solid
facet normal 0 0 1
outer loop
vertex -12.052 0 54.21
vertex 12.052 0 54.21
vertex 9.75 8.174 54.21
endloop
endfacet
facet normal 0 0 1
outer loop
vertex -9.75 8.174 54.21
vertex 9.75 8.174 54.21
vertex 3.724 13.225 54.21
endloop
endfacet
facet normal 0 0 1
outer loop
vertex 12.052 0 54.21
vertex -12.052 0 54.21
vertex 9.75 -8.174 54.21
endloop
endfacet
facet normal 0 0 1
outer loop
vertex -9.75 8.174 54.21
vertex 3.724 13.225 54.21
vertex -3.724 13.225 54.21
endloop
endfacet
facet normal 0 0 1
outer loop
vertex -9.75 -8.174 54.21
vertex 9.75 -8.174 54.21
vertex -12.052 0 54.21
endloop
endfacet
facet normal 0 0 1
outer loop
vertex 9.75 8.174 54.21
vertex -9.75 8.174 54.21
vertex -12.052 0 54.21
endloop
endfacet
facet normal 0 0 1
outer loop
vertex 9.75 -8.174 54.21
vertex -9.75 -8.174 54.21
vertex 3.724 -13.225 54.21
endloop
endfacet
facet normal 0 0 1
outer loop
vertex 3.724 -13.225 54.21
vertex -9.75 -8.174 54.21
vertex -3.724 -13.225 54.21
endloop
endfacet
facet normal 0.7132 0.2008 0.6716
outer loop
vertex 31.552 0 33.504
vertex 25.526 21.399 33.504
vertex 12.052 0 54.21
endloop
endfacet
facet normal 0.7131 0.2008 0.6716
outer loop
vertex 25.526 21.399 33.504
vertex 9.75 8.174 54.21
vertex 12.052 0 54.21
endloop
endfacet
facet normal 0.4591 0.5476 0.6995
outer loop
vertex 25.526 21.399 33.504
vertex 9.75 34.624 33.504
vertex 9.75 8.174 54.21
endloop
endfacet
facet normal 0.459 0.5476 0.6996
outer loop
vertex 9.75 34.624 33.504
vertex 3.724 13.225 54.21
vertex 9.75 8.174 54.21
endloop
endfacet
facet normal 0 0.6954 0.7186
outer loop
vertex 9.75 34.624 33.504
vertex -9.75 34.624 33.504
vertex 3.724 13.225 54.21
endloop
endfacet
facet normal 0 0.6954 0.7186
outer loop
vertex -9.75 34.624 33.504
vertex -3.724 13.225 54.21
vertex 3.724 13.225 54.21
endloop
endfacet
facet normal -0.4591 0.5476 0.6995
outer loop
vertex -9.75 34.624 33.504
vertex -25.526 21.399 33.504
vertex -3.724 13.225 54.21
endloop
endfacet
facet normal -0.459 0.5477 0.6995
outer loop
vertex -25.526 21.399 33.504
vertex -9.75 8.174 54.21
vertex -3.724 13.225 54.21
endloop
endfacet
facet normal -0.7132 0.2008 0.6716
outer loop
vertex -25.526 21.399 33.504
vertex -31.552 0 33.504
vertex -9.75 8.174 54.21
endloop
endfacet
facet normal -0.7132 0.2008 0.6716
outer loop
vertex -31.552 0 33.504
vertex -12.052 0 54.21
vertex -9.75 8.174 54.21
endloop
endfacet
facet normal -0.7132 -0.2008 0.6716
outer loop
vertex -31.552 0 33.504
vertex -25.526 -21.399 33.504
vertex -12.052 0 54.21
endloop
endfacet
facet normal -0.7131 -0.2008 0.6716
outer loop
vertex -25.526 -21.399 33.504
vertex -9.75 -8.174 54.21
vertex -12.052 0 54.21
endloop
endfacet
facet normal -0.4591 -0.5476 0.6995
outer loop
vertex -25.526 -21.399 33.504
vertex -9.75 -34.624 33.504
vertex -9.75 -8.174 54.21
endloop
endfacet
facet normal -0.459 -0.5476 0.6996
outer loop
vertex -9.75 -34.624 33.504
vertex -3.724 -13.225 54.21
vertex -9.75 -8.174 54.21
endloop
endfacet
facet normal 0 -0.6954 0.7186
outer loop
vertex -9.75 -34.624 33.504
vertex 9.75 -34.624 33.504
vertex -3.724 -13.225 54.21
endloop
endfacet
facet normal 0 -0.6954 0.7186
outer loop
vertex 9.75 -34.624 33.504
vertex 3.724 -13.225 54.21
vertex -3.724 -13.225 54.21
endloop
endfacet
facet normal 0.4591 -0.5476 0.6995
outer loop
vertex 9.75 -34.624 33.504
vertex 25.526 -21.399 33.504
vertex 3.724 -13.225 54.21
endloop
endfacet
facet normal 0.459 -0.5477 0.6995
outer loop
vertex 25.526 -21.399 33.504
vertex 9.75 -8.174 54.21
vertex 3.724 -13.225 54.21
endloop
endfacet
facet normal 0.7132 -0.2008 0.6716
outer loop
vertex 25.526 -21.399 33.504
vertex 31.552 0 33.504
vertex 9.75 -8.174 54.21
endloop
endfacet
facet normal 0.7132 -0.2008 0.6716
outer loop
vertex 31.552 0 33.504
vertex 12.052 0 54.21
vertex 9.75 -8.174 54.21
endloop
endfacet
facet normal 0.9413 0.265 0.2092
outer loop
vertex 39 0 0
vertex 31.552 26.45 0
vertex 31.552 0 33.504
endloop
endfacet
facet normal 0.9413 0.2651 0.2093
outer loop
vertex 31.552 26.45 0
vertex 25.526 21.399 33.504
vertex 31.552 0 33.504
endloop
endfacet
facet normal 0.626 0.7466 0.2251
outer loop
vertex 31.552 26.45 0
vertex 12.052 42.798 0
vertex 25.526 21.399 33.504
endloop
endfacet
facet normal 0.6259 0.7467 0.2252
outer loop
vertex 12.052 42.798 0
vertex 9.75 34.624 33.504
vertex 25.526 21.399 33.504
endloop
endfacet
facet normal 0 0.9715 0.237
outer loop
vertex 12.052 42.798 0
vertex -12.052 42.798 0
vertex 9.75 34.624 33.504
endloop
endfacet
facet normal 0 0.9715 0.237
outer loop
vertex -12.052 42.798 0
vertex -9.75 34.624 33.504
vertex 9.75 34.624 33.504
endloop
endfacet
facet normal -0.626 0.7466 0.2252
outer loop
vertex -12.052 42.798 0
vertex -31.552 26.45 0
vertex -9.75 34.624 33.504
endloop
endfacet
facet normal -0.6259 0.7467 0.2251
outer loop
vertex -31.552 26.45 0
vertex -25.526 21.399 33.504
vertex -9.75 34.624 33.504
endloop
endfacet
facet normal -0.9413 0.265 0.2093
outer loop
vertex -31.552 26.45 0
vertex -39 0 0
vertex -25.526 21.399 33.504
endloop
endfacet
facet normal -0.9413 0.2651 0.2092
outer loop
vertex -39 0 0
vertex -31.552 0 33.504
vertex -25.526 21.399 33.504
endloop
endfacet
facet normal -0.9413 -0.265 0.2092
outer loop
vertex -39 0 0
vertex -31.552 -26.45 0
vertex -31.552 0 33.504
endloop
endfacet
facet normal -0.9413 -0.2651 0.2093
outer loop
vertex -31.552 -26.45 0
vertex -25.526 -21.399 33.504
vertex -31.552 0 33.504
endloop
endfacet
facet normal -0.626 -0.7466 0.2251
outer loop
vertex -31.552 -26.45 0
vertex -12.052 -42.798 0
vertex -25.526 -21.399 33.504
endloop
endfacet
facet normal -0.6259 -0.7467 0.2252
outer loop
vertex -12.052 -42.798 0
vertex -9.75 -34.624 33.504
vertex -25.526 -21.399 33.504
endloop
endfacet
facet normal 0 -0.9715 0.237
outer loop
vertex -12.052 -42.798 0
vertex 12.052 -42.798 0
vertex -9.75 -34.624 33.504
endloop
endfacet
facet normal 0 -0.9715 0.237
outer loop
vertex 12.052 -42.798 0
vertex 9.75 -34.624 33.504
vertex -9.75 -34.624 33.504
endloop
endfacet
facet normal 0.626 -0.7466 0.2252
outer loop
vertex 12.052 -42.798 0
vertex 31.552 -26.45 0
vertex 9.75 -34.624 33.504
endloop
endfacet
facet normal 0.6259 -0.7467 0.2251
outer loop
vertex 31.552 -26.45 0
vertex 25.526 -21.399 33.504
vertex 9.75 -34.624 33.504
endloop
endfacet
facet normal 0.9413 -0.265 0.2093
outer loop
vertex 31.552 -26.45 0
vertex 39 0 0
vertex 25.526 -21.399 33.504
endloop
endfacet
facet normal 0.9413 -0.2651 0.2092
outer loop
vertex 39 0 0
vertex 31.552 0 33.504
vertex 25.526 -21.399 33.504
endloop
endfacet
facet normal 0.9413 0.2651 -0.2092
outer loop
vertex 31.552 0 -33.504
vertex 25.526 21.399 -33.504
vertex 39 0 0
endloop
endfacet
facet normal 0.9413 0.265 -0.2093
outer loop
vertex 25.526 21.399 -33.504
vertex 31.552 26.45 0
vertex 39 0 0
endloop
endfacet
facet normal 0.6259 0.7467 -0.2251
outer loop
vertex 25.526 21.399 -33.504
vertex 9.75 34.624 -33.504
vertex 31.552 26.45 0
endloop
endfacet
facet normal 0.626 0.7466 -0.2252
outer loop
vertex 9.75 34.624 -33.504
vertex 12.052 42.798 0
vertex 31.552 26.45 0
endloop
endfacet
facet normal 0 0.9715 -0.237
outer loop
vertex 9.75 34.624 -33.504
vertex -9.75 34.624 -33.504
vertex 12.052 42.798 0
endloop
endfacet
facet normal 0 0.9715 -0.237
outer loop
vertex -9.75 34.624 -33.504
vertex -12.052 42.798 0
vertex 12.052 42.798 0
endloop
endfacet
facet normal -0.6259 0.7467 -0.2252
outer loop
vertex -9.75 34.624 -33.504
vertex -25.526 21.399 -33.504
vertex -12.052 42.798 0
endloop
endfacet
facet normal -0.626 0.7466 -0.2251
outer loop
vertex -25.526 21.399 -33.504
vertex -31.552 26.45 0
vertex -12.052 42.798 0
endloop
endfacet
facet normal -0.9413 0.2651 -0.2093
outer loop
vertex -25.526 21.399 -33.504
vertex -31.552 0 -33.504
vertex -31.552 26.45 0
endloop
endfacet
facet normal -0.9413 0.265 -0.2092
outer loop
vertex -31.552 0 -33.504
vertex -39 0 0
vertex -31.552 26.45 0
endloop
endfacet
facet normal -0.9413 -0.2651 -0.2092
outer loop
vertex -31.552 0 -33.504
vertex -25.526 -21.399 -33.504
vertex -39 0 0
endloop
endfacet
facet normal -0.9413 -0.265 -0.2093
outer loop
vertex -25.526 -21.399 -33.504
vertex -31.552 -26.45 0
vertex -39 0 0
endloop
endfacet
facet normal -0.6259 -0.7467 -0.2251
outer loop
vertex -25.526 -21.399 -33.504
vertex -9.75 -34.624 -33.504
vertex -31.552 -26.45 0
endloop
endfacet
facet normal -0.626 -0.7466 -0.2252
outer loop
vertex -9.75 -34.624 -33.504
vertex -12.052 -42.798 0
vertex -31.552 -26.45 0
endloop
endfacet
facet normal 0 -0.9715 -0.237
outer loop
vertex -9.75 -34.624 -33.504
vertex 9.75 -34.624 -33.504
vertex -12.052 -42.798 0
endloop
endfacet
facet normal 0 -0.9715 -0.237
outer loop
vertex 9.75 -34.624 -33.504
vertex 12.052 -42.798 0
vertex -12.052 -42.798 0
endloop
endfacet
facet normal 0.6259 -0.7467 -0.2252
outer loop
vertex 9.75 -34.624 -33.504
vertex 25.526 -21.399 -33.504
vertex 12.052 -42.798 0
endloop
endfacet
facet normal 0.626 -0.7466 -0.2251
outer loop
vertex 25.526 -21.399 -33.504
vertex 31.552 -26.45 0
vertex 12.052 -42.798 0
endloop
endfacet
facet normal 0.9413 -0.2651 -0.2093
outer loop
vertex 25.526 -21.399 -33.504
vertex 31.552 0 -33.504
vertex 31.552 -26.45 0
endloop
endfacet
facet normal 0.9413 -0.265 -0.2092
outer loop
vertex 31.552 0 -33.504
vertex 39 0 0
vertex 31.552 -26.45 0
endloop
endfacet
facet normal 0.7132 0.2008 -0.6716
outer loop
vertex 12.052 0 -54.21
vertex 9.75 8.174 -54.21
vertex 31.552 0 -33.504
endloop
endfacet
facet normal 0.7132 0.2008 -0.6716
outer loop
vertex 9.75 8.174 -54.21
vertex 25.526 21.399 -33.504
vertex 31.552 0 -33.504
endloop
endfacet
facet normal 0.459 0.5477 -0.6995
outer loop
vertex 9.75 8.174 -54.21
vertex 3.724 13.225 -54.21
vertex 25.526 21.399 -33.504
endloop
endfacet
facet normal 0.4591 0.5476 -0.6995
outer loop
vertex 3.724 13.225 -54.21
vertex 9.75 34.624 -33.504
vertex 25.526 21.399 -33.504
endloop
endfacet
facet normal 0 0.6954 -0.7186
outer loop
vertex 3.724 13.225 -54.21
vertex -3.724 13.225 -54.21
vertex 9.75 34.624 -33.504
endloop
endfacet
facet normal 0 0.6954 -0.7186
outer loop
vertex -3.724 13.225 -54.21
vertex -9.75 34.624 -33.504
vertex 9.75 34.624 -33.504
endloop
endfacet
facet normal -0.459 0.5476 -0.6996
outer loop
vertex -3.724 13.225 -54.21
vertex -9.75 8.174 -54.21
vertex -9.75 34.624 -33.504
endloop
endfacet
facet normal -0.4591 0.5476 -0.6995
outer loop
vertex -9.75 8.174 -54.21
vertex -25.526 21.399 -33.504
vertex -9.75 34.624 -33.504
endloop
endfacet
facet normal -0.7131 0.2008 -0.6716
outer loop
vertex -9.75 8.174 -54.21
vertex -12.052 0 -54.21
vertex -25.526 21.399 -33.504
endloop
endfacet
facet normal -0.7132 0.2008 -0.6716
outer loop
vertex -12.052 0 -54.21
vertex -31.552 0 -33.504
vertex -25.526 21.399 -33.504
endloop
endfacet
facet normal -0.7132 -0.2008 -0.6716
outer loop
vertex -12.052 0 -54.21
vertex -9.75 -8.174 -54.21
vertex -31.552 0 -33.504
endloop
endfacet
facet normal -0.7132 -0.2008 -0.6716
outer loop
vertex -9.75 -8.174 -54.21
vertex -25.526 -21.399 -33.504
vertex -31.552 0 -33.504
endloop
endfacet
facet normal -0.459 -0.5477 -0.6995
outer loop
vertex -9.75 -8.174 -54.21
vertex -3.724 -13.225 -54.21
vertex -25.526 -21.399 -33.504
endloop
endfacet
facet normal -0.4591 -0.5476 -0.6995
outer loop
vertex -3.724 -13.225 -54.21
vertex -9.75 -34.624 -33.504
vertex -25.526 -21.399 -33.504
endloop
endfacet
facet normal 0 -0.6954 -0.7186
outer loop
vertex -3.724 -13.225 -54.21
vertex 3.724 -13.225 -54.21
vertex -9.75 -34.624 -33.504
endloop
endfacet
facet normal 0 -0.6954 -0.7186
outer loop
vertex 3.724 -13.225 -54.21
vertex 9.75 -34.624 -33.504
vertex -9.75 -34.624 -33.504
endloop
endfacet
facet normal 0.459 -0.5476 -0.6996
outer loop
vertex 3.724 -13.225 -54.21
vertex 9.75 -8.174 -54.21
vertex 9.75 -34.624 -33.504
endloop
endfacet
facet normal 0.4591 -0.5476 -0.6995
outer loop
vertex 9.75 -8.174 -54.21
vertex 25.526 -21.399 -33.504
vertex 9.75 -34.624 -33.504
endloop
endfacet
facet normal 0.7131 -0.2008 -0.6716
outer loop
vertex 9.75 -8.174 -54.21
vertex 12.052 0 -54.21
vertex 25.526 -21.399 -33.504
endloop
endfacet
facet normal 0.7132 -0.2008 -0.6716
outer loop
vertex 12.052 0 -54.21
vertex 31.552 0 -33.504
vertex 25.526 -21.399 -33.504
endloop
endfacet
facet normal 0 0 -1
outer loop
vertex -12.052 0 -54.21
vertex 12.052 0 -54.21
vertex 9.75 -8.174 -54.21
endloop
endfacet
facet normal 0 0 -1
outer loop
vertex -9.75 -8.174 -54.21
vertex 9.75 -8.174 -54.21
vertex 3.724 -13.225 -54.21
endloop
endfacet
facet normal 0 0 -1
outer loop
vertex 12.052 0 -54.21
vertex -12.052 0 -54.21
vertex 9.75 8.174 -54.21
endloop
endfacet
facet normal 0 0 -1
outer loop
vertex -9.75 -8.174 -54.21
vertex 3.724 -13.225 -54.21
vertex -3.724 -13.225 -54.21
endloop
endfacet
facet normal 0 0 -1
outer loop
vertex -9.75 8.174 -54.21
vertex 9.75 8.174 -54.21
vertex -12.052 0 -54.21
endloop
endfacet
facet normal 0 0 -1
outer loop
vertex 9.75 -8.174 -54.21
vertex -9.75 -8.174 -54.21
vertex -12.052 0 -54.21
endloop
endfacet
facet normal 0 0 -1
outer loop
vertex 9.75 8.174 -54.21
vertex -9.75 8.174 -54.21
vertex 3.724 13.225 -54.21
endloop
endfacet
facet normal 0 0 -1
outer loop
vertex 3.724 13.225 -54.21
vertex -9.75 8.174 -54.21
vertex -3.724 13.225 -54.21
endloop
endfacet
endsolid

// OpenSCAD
// Generated by SolidPython 1.0.1 on 2020-07-29 00:46:51


scale(v = [13, 15, 19]) {
	sphere(r = 3);
}
/***********************************************
*********      SolidPython code:      **********
************************************************
 
# import packages: SolidPython
from solid import *
from solid.utils import *
from itertools import chain, combinations, permutations


class Resize:

    def __init__(self, scad_file):
        self.scad_file = scad_file
        #self.scad_file = import_scad(scad_file)
        # cone/cylinder param:
        self.r1 = 0
        self.r2 = 0
        self.h = 0
        # rectangular prism param:
        self.w = 0
        self.l = 0
        # ellipse param:
        self.r = 0

    # import OpenScad code (file name corresponds to shape)


    # classify shape + parameters
    def assign(self, param1, param2, param3):
        if self.scad_file == 'cone.scad':
            self.r1 = param1
            self.r2 = param2
            self.h = param3
        elif self.scad_file == 'cylinder.scad':
            self.r1 = param1
            self.r2 = param2
            self.h = param3
        elif self.scad_file == 'rectangularPrism.scad':
            self.h = param1
            self.l = param2
            self.w = param3
        else:
            self.r = param1
            self.h = param2

    # resize parameters
    def iterate(self):
        x = range(3, 20, 2)
        i = 1
        if self.scad_file == 'cone.scad':
            tempList = list(permutations(x, 2))
            for temp in tempList:
                param1 = temp[0]
                param2 = temp[1]
                filepath = 'produced_scad_files/' + 'cone' + str(param1) + '_' + str(param2) + '_' + '.scad'
                scad_render_to_file(cylinder(h=param1, r1=param2, r2=0), filepath)

        elif self.scad_file == 'cylinder.scad':
            tempList = list(permutations(x, 3))
            for temp in tempList:
                param1 = temp[0]
                param2 = temp[1]
                filepath = 'produced_scad_files/' + 'cylinder' + str(param1) + '_' + str(param2) + '_' + '.scad'
                scad_render_to_file(cylinder(h=param1, r1=param2, r2=param2), filepath)

        elif self.scad_file == 'rectangularPrism.scad':
            tempList = list(permutations(x, 3))
            for temp in tempList:
                param1 = temp[0]
                param2 = temp[1]
                param3 = temp[2]
                filepath = 'produced_scad_files/' + 'rectangularPrism' + str(param1) + '_' + str(param2) + '_' + str(
                    param3) + '.scad'
                scad_render_to_file(cube(size=(param1, param2, param3)), filepath)

        elif self.scad_file == 'ellipse.scad':
            tempList = list(permutations(x, 4))
            for temp in tempList:
                param1 = temp[0]
                param2 = temp[1]
                param3 = temp[2]
                param4 = temp[3]
                filepath = 'produced_scad_files/' + 'ellipse' + str(param1) + '_' + str(param2) + '_' + str(param3) + '_' + str(param4) + '.scad'
                scad_render_to_file(scale([param1, param2, param3])(sphere(r=param4)), filepath)

    def render_to_scadfile(self):
        scad_render_to_file(scad, 'example.scad') 
 
************************************************/
